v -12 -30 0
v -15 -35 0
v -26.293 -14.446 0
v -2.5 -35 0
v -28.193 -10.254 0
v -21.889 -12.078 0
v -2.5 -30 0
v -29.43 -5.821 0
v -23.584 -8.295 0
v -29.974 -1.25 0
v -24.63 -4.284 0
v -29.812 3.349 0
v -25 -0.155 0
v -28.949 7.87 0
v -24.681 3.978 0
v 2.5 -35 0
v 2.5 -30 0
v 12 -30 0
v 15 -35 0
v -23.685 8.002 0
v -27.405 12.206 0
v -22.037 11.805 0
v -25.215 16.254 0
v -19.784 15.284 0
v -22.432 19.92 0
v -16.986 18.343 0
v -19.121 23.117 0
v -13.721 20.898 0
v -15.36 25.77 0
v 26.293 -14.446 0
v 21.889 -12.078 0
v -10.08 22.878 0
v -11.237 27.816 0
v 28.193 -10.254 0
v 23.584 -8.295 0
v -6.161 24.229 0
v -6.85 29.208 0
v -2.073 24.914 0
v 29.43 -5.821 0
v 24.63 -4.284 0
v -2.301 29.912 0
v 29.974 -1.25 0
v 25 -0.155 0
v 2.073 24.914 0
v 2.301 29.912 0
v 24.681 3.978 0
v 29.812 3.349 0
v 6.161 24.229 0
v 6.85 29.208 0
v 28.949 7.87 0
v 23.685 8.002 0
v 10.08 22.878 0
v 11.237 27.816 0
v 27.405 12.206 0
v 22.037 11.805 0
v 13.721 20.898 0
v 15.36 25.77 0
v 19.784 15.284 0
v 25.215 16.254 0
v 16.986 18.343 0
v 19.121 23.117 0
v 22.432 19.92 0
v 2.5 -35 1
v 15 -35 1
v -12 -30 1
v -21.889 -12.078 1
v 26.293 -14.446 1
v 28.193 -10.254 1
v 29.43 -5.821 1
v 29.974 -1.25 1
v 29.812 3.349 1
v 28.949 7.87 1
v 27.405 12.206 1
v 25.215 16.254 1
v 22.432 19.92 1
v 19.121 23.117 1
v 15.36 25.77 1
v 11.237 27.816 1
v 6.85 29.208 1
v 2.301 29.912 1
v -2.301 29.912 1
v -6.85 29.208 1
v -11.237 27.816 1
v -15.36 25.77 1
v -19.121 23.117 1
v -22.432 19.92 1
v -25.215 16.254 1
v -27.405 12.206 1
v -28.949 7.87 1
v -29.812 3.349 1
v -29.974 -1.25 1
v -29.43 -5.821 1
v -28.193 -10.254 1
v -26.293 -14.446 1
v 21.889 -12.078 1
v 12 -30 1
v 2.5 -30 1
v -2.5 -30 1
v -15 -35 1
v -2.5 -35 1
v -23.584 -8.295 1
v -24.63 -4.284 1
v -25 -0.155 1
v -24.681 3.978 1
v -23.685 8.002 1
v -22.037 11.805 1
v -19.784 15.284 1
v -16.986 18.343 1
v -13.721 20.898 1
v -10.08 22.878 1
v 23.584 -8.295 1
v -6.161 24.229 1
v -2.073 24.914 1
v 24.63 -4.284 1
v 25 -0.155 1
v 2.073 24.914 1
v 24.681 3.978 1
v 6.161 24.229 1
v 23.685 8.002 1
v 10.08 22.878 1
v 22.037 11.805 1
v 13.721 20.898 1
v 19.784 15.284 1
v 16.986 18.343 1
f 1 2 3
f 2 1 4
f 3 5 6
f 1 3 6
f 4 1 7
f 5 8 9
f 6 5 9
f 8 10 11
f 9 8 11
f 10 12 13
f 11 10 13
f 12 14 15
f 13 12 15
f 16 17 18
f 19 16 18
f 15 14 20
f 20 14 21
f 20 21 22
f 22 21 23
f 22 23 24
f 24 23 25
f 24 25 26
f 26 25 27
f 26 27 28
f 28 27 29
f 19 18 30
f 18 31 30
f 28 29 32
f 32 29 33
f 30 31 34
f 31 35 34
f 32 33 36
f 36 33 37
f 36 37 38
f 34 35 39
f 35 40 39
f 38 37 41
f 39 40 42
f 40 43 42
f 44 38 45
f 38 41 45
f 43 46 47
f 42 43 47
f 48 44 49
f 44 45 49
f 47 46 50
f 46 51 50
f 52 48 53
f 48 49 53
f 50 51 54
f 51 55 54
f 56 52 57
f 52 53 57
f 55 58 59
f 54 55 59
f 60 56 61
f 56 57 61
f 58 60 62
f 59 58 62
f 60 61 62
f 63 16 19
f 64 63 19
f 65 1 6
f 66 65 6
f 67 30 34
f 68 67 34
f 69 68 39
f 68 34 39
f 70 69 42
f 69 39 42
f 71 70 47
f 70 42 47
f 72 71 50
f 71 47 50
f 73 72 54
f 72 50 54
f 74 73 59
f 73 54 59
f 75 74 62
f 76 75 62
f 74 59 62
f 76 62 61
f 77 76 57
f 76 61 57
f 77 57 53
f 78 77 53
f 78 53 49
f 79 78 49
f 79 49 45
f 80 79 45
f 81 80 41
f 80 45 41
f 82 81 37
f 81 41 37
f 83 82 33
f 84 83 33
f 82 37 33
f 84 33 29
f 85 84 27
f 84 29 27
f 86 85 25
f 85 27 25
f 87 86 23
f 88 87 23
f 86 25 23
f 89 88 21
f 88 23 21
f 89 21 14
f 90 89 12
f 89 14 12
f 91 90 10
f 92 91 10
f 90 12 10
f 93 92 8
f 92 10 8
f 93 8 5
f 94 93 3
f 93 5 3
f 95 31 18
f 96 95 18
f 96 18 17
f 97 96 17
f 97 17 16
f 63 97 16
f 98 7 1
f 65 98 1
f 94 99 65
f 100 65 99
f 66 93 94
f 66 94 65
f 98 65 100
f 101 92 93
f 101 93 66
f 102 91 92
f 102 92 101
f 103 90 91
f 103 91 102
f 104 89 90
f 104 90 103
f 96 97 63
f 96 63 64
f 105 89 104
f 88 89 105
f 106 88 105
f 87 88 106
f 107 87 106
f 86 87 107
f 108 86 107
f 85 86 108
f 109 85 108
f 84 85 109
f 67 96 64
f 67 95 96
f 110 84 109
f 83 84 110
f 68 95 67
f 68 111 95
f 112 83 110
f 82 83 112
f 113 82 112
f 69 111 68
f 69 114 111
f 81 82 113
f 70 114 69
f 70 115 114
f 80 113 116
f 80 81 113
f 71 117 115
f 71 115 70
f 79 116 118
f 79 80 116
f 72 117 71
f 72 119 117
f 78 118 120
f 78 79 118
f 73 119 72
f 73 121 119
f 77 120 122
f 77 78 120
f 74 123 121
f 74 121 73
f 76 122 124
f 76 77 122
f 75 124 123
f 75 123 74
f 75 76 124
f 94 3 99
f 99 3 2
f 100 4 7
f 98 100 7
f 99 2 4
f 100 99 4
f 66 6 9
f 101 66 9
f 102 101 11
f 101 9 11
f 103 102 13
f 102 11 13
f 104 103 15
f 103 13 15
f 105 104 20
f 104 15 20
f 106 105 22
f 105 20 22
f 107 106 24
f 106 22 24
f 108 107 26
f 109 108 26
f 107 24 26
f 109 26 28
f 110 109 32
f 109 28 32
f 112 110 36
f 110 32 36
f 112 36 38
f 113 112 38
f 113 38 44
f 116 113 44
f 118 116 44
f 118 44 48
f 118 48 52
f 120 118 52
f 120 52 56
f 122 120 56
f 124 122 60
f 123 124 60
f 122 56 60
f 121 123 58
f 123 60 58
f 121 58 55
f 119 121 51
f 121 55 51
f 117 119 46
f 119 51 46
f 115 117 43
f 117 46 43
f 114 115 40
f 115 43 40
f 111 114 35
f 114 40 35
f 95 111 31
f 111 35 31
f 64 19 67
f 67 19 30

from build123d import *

# Parameters (mm, degrees)
RESSALTO_EXTRUS_O3_DEPTH = 1


with BuildPart() as part:
    # Esboço1 → Ressalto-extrusão3 (new body)
    with BuildSketch(Plane.XY):
        with BuildLine():
            Line((5, -35), (15, -35))
            Line((15, -35), (26.292884648, -14.44590658))
            ThreePointArc((26.292884648, -14.44590658), (0, 30), (-26.292884648, -14.44590658))
            Line((-26.292884648, -14.44590658), (-15, -35))
            Line((-15, -35), (-5, -35))
            Line((-5, -35), (-2.5, -35))
            Line((-2.5, -35), (-2.5, -32.5))
            Line((-2.5, -32.5), (-2.5, -30))
            Line((-2.5, -30), (-5, -30))
            Line((-5, -30), (-12, -30))
            Line((-12, -30), (-21.889001071, -12.077732905))
            ThreePointArc((-21.889001071, -12.077732905), (0, 25), (21.889001071, -12.077732905))
            Line((21.889001071, -12.077732905), (12, -30))
            Line((12, -30), (5, -30))
            Line((5, -30), (2.5, -30))
            Line((2.5, -30), (2.5, -32.5))
            Line((2.5, -32.5), (2.5, -35))
            Line((2.5, -35), (5, -35))
        make_face()
    extrude(amount=RESSALTO_EXTRUS_O3_DEPTH)


solid = part.part
